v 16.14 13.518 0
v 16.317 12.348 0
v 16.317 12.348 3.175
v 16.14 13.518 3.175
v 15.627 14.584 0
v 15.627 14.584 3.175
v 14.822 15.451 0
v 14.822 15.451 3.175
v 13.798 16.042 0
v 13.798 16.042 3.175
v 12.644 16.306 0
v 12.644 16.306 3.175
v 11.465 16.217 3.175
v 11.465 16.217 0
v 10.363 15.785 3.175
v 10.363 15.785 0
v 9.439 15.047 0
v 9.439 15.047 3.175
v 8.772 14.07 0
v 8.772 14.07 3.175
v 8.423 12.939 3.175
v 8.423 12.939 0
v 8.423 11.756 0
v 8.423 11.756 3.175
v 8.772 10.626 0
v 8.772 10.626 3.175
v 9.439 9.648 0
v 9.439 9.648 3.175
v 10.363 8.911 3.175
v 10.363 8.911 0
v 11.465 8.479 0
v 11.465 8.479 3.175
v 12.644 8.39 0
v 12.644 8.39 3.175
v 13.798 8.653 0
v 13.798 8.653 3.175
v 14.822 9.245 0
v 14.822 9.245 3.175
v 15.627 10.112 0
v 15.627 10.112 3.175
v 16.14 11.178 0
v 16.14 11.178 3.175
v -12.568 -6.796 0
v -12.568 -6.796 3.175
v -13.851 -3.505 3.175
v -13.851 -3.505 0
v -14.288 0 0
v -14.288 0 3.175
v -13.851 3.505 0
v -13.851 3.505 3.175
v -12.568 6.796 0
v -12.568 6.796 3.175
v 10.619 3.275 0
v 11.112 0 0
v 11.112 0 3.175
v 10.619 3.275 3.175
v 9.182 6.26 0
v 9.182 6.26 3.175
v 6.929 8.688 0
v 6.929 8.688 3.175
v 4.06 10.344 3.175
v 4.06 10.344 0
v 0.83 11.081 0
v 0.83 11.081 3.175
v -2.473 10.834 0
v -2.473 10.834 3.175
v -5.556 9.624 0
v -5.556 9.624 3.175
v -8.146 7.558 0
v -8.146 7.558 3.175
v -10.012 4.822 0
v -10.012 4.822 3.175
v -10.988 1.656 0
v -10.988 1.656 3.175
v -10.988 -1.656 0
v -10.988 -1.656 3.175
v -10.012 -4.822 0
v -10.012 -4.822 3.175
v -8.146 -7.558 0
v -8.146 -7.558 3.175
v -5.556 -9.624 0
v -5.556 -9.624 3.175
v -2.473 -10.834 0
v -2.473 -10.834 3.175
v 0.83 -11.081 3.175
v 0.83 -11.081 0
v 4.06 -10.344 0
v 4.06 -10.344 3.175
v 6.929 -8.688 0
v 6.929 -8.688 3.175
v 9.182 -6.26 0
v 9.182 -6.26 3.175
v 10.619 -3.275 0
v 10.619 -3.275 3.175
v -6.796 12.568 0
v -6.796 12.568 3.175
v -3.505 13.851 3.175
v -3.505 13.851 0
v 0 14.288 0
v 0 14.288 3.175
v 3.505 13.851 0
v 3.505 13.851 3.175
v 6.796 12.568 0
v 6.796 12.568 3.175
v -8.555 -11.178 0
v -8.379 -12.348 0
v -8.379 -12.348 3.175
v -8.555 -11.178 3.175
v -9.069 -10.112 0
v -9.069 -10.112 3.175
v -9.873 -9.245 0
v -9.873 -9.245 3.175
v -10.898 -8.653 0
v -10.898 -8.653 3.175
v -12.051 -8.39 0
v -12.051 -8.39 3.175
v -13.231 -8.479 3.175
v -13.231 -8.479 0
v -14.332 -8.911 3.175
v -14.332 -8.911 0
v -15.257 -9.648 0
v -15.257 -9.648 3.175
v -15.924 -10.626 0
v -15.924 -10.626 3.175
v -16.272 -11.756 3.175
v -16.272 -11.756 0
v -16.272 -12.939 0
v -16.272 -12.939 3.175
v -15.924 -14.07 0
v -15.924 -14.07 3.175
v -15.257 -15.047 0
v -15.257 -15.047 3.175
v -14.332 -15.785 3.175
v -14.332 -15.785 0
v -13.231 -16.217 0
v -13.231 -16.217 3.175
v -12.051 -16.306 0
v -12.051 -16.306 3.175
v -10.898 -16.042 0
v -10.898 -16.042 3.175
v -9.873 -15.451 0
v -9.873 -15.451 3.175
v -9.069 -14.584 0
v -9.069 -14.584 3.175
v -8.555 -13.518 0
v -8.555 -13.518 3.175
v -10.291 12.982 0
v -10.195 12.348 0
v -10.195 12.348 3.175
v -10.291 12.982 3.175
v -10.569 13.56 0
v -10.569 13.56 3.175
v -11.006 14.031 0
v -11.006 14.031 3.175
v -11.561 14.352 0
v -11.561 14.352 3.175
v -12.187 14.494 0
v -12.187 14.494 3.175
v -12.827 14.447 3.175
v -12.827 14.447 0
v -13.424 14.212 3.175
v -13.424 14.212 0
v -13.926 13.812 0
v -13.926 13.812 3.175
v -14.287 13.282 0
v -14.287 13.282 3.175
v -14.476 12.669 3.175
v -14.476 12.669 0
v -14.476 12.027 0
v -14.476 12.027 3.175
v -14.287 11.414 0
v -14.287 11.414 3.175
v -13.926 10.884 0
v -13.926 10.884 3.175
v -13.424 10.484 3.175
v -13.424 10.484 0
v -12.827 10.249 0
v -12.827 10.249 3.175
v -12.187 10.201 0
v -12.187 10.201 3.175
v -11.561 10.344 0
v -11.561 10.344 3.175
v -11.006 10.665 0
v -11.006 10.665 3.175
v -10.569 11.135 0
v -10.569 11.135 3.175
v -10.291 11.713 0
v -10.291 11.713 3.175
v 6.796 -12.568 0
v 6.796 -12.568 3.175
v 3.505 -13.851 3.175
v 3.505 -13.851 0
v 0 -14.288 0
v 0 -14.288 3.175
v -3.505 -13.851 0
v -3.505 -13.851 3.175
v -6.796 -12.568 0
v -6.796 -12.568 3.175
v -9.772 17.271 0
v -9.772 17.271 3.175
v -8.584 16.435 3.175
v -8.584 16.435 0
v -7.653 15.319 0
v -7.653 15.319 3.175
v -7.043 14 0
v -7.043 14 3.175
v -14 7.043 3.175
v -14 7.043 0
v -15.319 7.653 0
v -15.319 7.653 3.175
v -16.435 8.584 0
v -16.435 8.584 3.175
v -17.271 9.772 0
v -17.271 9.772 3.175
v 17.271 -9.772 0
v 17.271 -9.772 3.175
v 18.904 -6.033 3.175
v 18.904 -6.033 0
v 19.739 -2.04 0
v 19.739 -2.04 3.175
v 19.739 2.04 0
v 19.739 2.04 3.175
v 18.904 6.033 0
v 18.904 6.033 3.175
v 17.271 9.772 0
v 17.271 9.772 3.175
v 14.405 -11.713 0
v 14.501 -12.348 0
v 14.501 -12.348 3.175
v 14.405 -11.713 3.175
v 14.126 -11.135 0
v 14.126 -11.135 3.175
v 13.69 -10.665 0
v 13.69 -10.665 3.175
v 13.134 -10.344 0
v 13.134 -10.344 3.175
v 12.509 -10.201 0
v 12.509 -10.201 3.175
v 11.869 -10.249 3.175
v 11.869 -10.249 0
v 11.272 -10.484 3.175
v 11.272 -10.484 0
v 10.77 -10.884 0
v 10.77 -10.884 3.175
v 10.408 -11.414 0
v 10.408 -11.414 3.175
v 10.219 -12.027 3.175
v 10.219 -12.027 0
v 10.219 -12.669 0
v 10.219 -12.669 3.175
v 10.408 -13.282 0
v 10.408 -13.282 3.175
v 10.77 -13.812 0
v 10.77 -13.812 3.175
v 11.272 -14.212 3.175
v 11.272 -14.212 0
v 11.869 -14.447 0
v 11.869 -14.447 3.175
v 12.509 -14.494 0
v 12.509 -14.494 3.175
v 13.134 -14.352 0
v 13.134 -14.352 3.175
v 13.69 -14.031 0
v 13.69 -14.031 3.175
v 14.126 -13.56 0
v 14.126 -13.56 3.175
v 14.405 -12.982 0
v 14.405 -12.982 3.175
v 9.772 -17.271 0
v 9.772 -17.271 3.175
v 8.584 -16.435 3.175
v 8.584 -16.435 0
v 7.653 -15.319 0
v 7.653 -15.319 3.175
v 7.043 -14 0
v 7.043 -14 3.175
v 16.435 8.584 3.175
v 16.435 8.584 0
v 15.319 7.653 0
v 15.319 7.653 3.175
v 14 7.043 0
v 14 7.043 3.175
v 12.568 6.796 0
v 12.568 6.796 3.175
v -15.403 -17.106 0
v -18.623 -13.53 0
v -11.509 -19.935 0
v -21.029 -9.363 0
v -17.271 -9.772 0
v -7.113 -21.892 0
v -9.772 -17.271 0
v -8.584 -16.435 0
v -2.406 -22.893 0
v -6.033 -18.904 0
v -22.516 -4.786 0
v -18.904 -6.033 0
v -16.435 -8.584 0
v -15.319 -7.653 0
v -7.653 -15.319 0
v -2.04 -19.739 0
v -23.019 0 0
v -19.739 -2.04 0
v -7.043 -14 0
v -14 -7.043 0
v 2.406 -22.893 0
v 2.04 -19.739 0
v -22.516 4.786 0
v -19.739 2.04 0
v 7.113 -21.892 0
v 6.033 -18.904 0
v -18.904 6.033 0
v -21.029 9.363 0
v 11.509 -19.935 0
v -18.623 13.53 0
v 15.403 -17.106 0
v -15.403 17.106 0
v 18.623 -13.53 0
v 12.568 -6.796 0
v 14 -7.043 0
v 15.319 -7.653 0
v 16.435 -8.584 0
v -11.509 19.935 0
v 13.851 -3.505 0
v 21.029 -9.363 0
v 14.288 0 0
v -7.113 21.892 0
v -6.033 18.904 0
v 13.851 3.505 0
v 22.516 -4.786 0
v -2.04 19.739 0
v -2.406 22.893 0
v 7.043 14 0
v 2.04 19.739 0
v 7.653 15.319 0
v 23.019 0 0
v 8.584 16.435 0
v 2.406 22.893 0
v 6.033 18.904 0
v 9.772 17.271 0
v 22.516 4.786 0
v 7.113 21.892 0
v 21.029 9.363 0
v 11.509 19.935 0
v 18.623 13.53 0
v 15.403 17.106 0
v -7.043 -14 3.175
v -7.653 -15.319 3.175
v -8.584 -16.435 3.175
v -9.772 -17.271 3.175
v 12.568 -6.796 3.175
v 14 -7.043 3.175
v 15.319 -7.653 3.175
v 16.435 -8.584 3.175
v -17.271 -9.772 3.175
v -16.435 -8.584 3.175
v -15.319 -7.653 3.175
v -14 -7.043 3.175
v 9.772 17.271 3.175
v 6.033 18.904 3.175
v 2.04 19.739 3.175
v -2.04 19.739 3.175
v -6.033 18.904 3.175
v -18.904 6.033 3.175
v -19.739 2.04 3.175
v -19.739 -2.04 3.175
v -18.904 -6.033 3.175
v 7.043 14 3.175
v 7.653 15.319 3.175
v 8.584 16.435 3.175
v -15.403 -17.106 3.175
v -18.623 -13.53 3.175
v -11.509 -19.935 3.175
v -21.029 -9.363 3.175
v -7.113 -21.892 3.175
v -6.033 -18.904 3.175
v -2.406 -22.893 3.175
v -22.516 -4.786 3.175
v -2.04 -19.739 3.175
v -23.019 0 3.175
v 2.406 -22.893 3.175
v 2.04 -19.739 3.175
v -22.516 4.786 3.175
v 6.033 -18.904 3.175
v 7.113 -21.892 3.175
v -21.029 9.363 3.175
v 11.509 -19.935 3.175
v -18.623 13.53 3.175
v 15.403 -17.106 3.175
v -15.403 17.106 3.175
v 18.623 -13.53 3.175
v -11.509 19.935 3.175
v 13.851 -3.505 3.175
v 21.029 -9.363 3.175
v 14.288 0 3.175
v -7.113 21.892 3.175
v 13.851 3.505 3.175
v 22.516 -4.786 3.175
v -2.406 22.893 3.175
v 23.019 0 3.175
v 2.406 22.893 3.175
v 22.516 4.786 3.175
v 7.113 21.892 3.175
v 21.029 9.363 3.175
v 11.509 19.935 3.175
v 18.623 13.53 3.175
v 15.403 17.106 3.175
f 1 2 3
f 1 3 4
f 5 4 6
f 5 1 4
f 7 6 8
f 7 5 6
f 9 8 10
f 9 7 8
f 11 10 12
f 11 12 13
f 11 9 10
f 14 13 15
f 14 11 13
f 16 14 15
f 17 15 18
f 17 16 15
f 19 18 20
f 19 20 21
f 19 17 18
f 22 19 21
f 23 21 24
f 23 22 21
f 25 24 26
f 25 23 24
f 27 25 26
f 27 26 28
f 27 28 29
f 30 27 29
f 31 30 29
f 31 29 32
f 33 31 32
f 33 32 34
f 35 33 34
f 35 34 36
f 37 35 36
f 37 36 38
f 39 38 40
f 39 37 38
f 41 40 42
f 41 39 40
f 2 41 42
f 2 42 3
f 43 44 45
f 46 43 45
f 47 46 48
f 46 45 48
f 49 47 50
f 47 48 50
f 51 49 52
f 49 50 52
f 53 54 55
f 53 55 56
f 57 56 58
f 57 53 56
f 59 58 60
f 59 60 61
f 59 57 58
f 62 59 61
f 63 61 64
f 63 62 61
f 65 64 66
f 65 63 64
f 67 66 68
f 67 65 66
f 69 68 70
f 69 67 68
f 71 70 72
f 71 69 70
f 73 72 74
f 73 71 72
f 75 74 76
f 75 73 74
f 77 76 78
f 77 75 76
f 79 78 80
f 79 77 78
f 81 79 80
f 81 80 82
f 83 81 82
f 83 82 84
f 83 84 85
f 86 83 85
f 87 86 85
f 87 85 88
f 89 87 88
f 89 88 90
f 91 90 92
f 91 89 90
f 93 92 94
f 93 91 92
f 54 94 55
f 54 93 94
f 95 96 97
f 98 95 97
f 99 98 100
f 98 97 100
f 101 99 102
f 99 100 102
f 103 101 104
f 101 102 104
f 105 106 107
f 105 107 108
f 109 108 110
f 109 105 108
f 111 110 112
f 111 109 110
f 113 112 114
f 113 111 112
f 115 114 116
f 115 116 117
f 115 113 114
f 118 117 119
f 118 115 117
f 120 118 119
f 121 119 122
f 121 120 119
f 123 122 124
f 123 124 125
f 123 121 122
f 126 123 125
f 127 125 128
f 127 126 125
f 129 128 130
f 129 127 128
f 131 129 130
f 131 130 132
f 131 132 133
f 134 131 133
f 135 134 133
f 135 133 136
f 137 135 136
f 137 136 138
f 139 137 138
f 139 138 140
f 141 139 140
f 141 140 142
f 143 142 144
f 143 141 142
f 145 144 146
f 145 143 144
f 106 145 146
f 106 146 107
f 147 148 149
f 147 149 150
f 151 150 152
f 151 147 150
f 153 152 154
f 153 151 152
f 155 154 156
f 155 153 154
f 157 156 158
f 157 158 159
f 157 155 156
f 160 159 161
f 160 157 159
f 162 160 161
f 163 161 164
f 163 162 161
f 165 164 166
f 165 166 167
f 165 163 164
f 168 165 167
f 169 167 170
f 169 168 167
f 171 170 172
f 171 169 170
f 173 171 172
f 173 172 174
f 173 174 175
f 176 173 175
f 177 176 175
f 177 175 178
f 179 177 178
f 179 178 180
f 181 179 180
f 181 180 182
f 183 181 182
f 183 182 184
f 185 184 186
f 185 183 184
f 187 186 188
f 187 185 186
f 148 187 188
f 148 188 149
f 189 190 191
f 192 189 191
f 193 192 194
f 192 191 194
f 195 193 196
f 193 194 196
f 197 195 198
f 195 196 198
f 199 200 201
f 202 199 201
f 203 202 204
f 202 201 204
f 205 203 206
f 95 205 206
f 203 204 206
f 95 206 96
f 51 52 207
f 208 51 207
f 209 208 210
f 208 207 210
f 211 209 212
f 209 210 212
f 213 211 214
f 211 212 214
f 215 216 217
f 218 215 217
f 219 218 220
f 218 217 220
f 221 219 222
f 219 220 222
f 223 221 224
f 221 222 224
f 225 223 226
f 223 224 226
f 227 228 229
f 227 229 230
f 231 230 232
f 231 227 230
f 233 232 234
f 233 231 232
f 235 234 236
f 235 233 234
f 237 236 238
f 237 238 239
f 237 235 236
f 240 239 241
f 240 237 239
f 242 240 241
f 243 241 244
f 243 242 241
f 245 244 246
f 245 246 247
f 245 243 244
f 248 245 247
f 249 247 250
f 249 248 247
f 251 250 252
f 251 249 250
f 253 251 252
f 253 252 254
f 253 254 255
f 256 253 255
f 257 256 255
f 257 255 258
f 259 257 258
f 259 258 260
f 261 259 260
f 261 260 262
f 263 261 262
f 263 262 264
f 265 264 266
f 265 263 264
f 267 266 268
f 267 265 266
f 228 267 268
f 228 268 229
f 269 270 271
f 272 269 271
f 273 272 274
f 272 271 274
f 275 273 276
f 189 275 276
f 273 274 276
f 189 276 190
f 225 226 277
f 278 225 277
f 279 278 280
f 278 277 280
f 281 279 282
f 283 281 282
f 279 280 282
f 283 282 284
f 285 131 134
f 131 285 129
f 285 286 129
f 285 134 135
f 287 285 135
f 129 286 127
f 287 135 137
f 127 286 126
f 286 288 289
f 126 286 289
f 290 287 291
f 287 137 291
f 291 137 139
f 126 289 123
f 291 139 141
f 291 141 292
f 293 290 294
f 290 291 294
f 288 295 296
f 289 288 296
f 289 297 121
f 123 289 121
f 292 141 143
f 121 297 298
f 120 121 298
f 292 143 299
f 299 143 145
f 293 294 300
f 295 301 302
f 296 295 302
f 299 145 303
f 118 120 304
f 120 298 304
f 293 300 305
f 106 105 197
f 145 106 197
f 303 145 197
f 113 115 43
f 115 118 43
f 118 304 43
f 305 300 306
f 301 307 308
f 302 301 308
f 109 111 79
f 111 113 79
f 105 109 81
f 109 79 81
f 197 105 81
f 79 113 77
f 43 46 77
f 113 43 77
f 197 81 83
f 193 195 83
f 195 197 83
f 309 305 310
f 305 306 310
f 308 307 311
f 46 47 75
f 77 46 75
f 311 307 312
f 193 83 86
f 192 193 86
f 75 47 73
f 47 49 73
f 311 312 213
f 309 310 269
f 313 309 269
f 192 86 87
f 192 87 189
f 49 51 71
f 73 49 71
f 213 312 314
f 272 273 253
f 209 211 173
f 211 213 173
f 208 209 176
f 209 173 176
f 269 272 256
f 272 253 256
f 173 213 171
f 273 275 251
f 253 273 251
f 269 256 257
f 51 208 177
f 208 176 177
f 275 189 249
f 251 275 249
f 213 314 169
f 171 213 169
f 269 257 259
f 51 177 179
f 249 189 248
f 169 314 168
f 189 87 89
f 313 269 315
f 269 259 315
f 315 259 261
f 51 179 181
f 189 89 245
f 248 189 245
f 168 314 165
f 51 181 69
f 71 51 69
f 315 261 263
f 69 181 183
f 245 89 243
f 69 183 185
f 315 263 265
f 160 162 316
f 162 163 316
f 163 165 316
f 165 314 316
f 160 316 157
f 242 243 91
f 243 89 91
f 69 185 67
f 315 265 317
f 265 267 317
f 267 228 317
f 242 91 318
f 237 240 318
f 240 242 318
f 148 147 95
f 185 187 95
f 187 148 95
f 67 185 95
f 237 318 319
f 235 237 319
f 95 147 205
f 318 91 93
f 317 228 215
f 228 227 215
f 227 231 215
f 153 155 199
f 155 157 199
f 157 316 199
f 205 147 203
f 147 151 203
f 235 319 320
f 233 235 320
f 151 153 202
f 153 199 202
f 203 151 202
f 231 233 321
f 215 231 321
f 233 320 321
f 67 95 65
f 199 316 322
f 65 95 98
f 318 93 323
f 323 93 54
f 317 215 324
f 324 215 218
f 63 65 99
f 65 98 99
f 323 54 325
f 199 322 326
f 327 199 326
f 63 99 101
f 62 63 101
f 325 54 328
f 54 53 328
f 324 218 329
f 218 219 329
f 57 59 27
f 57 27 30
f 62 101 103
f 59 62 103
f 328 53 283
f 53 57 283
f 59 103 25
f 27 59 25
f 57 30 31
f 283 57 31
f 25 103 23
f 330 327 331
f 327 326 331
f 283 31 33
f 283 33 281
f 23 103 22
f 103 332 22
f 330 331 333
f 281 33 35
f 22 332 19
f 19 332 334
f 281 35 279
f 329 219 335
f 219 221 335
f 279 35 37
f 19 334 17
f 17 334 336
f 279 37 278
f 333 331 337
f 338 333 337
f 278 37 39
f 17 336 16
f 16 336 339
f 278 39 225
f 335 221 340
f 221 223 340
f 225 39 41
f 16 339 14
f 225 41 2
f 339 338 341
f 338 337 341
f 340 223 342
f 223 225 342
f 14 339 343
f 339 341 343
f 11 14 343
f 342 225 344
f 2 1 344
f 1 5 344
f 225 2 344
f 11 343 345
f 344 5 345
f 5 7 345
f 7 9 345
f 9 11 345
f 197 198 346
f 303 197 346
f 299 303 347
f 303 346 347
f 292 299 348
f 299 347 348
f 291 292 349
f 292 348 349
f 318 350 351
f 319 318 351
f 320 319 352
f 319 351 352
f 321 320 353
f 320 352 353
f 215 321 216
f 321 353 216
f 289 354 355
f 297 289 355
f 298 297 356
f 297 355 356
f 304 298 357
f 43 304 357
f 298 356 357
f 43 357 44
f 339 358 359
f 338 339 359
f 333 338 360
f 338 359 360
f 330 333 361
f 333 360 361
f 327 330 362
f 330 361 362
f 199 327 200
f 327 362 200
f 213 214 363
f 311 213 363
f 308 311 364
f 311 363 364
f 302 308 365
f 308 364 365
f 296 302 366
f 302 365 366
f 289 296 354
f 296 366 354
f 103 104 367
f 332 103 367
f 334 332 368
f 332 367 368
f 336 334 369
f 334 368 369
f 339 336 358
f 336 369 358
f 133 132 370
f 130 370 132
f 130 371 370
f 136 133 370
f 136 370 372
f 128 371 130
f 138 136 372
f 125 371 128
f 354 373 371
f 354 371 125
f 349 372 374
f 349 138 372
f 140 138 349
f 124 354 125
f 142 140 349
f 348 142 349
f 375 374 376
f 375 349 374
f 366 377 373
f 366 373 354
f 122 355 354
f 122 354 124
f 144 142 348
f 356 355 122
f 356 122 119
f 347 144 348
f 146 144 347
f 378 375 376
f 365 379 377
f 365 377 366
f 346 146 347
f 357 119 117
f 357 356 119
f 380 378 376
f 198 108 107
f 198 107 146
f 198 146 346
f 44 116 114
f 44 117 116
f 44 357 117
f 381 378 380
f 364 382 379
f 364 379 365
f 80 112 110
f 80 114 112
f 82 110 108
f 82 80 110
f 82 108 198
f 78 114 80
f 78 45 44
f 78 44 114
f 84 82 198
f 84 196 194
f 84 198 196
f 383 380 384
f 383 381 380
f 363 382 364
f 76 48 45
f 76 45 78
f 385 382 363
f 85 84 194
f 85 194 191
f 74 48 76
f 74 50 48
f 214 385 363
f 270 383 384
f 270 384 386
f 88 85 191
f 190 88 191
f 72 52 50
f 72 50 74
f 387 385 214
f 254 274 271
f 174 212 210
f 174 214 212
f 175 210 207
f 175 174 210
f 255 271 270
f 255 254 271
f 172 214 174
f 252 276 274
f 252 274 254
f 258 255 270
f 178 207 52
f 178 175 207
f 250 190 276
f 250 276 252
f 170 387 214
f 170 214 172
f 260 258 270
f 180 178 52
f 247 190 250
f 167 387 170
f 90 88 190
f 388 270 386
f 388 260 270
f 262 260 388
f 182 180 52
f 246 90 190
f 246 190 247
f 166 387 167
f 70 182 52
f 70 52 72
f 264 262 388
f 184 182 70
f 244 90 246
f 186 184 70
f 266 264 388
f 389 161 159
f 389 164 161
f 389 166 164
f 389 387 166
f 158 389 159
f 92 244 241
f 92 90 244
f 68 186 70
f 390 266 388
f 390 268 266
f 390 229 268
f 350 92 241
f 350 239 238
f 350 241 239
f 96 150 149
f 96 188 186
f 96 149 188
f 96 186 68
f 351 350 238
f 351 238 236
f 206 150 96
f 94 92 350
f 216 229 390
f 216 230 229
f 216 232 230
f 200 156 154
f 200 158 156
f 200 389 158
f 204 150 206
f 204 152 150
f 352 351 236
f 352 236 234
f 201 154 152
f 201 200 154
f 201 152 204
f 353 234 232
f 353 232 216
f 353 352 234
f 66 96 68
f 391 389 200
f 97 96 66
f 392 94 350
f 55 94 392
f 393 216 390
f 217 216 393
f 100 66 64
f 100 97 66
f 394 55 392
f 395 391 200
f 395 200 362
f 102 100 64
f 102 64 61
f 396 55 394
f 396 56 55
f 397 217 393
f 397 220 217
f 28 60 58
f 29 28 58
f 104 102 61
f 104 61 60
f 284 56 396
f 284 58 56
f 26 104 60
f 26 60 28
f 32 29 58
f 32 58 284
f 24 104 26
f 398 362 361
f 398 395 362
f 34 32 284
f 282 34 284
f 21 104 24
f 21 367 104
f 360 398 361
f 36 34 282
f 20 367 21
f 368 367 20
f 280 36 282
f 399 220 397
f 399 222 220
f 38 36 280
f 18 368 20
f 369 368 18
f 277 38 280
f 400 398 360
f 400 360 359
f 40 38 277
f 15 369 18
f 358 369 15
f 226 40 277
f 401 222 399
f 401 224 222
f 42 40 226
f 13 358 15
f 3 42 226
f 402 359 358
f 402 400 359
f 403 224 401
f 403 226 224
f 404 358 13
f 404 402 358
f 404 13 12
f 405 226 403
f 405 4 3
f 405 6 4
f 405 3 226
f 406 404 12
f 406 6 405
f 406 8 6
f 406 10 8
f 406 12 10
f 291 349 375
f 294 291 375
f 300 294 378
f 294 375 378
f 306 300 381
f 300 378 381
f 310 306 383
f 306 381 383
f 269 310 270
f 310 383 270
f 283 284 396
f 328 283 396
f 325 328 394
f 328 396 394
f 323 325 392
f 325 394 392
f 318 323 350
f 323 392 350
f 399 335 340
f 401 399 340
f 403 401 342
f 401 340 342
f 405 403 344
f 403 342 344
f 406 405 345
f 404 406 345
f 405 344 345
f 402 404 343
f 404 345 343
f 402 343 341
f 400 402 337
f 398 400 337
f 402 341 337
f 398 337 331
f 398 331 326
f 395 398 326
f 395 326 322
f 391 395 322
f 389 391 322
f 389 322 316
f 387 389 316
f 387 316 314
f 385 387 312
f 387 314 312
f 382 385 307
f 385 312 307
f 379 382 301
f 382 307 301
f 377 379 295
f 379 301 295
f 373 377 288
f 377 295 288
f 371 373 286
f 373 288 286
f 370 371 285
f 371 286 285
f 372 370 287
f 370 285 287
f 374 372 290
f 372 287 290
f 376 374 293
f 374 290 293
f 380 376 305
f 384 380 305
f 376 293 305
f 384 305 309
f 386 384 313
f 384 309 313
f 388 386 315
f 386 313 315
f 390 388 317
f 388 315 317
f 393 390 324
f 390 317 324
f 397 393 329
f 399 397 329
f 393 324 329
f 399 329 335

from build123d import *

# Parameters (mm, degrees)
F0_R     = 23.01875
F0_R_2   = 3.96875
F0_R_3   = 2.15265
F0_R_4   = 11.1125
F1_DEPTH = 3.175
F3_DEPTH = 3.175


with BuildPart() as f1:
    # F0 (on Top) → F1 (new body)
    with BuildSketch(Plane.XY):
        Circle(F0_R)
        with Locations((-12.347852, -12.347852)):
            Circle(F0_R_2, mode=Mode.SUBTRACT)
        with Locations((12.347852, -12.347852)):
            Circle(F0_R_3, mode=Mode.SUBTRACT)
        with Locations((-12.347852, 12.347852)):
            Circle(F0_R_3, mode=Mode.SUBTRACT)
        Circle(F0_R_4, mode=Mode.SUBTRACT)
        with Locations((12.347852, 12.347852)):
            Circle(F0_R_2, mode=Mode.SUBTRACT)
    extrude(amount=F1_DEPTH)

    # F2 (on face) → F3 (cut, through all)
    with BuildSketch(Plane.XY.offset(3.175)):
        with BuildLine():
            ThreePointArc((-9.771912, 17.270905), (-7.652597, 15.318794), (-6.795954, 12.567723))
            ThreePointArc((-6.795954, 12.567723), (0, 14.2875), (6.795954, 12.567723))
            ThreePointArc((6.795954, 12.567723), (7.652597, 15.318794), (9.771912, 17.270905))
            ThreePointArc((9.771912, 17.270905), (0, 19.84375), (-9.771912, 17.270905))
        make_face()
        with BuildLine():
            ThreePointArc((-12.567723, 6.795954), (-15.318794, 7.652597), (-17.270905, 9.771912))
            ThreePointArc((-17.270905, 9.771912), (-19.84375, 0), (-17.270905, -9.771912))
            ThreePointArc((-17.270905, -9.771912), (-15.318794, -7.652597), (-12.567723, -6.795954))
            ThreePointArc((-12.567723, -6.795954), (-14.2875, 0), (-12.567723, 6.795954))
        make_face()
        with BuildLine():
            ThreePointArc((17.270905, 9.771912), (15.318794, 7.652597), (12.567723, 6.795954))
            ThreePointArc((12.567723, 6.795954), (14.2875, 0), (12.567723, -6.795954))
            ThreePointArc((12.567723, -6.795954), (15.318794, -7.652597), (17.270905, -9.771912))
            ThreePointArc((17.270905, -9.771912), (19.84375, 0), (17.270905, 9.771912))
        make_face()
        with BuildLine():
            ThreePointArc((-6.795954, -12.567723), (-7.652597, -15.318794), (-9.771912, -17.270905))
            ThreePointArc((-9.771912, -17.270905), (0, -19.84375), (9.771912, -17.270905))
            ThreePointArc((9.771912, -17.270905), (7.652597, -15.318794), (6.795954, -12.567723))
            ThreePointArc((6.795954, -12.567723), (0, -14.2875), (-6.795954, -12.567723))
        make_face()
    extrude(amount=-F3_DEPTH, mode=Mode.SUBTRACT)


solid = f1.part
